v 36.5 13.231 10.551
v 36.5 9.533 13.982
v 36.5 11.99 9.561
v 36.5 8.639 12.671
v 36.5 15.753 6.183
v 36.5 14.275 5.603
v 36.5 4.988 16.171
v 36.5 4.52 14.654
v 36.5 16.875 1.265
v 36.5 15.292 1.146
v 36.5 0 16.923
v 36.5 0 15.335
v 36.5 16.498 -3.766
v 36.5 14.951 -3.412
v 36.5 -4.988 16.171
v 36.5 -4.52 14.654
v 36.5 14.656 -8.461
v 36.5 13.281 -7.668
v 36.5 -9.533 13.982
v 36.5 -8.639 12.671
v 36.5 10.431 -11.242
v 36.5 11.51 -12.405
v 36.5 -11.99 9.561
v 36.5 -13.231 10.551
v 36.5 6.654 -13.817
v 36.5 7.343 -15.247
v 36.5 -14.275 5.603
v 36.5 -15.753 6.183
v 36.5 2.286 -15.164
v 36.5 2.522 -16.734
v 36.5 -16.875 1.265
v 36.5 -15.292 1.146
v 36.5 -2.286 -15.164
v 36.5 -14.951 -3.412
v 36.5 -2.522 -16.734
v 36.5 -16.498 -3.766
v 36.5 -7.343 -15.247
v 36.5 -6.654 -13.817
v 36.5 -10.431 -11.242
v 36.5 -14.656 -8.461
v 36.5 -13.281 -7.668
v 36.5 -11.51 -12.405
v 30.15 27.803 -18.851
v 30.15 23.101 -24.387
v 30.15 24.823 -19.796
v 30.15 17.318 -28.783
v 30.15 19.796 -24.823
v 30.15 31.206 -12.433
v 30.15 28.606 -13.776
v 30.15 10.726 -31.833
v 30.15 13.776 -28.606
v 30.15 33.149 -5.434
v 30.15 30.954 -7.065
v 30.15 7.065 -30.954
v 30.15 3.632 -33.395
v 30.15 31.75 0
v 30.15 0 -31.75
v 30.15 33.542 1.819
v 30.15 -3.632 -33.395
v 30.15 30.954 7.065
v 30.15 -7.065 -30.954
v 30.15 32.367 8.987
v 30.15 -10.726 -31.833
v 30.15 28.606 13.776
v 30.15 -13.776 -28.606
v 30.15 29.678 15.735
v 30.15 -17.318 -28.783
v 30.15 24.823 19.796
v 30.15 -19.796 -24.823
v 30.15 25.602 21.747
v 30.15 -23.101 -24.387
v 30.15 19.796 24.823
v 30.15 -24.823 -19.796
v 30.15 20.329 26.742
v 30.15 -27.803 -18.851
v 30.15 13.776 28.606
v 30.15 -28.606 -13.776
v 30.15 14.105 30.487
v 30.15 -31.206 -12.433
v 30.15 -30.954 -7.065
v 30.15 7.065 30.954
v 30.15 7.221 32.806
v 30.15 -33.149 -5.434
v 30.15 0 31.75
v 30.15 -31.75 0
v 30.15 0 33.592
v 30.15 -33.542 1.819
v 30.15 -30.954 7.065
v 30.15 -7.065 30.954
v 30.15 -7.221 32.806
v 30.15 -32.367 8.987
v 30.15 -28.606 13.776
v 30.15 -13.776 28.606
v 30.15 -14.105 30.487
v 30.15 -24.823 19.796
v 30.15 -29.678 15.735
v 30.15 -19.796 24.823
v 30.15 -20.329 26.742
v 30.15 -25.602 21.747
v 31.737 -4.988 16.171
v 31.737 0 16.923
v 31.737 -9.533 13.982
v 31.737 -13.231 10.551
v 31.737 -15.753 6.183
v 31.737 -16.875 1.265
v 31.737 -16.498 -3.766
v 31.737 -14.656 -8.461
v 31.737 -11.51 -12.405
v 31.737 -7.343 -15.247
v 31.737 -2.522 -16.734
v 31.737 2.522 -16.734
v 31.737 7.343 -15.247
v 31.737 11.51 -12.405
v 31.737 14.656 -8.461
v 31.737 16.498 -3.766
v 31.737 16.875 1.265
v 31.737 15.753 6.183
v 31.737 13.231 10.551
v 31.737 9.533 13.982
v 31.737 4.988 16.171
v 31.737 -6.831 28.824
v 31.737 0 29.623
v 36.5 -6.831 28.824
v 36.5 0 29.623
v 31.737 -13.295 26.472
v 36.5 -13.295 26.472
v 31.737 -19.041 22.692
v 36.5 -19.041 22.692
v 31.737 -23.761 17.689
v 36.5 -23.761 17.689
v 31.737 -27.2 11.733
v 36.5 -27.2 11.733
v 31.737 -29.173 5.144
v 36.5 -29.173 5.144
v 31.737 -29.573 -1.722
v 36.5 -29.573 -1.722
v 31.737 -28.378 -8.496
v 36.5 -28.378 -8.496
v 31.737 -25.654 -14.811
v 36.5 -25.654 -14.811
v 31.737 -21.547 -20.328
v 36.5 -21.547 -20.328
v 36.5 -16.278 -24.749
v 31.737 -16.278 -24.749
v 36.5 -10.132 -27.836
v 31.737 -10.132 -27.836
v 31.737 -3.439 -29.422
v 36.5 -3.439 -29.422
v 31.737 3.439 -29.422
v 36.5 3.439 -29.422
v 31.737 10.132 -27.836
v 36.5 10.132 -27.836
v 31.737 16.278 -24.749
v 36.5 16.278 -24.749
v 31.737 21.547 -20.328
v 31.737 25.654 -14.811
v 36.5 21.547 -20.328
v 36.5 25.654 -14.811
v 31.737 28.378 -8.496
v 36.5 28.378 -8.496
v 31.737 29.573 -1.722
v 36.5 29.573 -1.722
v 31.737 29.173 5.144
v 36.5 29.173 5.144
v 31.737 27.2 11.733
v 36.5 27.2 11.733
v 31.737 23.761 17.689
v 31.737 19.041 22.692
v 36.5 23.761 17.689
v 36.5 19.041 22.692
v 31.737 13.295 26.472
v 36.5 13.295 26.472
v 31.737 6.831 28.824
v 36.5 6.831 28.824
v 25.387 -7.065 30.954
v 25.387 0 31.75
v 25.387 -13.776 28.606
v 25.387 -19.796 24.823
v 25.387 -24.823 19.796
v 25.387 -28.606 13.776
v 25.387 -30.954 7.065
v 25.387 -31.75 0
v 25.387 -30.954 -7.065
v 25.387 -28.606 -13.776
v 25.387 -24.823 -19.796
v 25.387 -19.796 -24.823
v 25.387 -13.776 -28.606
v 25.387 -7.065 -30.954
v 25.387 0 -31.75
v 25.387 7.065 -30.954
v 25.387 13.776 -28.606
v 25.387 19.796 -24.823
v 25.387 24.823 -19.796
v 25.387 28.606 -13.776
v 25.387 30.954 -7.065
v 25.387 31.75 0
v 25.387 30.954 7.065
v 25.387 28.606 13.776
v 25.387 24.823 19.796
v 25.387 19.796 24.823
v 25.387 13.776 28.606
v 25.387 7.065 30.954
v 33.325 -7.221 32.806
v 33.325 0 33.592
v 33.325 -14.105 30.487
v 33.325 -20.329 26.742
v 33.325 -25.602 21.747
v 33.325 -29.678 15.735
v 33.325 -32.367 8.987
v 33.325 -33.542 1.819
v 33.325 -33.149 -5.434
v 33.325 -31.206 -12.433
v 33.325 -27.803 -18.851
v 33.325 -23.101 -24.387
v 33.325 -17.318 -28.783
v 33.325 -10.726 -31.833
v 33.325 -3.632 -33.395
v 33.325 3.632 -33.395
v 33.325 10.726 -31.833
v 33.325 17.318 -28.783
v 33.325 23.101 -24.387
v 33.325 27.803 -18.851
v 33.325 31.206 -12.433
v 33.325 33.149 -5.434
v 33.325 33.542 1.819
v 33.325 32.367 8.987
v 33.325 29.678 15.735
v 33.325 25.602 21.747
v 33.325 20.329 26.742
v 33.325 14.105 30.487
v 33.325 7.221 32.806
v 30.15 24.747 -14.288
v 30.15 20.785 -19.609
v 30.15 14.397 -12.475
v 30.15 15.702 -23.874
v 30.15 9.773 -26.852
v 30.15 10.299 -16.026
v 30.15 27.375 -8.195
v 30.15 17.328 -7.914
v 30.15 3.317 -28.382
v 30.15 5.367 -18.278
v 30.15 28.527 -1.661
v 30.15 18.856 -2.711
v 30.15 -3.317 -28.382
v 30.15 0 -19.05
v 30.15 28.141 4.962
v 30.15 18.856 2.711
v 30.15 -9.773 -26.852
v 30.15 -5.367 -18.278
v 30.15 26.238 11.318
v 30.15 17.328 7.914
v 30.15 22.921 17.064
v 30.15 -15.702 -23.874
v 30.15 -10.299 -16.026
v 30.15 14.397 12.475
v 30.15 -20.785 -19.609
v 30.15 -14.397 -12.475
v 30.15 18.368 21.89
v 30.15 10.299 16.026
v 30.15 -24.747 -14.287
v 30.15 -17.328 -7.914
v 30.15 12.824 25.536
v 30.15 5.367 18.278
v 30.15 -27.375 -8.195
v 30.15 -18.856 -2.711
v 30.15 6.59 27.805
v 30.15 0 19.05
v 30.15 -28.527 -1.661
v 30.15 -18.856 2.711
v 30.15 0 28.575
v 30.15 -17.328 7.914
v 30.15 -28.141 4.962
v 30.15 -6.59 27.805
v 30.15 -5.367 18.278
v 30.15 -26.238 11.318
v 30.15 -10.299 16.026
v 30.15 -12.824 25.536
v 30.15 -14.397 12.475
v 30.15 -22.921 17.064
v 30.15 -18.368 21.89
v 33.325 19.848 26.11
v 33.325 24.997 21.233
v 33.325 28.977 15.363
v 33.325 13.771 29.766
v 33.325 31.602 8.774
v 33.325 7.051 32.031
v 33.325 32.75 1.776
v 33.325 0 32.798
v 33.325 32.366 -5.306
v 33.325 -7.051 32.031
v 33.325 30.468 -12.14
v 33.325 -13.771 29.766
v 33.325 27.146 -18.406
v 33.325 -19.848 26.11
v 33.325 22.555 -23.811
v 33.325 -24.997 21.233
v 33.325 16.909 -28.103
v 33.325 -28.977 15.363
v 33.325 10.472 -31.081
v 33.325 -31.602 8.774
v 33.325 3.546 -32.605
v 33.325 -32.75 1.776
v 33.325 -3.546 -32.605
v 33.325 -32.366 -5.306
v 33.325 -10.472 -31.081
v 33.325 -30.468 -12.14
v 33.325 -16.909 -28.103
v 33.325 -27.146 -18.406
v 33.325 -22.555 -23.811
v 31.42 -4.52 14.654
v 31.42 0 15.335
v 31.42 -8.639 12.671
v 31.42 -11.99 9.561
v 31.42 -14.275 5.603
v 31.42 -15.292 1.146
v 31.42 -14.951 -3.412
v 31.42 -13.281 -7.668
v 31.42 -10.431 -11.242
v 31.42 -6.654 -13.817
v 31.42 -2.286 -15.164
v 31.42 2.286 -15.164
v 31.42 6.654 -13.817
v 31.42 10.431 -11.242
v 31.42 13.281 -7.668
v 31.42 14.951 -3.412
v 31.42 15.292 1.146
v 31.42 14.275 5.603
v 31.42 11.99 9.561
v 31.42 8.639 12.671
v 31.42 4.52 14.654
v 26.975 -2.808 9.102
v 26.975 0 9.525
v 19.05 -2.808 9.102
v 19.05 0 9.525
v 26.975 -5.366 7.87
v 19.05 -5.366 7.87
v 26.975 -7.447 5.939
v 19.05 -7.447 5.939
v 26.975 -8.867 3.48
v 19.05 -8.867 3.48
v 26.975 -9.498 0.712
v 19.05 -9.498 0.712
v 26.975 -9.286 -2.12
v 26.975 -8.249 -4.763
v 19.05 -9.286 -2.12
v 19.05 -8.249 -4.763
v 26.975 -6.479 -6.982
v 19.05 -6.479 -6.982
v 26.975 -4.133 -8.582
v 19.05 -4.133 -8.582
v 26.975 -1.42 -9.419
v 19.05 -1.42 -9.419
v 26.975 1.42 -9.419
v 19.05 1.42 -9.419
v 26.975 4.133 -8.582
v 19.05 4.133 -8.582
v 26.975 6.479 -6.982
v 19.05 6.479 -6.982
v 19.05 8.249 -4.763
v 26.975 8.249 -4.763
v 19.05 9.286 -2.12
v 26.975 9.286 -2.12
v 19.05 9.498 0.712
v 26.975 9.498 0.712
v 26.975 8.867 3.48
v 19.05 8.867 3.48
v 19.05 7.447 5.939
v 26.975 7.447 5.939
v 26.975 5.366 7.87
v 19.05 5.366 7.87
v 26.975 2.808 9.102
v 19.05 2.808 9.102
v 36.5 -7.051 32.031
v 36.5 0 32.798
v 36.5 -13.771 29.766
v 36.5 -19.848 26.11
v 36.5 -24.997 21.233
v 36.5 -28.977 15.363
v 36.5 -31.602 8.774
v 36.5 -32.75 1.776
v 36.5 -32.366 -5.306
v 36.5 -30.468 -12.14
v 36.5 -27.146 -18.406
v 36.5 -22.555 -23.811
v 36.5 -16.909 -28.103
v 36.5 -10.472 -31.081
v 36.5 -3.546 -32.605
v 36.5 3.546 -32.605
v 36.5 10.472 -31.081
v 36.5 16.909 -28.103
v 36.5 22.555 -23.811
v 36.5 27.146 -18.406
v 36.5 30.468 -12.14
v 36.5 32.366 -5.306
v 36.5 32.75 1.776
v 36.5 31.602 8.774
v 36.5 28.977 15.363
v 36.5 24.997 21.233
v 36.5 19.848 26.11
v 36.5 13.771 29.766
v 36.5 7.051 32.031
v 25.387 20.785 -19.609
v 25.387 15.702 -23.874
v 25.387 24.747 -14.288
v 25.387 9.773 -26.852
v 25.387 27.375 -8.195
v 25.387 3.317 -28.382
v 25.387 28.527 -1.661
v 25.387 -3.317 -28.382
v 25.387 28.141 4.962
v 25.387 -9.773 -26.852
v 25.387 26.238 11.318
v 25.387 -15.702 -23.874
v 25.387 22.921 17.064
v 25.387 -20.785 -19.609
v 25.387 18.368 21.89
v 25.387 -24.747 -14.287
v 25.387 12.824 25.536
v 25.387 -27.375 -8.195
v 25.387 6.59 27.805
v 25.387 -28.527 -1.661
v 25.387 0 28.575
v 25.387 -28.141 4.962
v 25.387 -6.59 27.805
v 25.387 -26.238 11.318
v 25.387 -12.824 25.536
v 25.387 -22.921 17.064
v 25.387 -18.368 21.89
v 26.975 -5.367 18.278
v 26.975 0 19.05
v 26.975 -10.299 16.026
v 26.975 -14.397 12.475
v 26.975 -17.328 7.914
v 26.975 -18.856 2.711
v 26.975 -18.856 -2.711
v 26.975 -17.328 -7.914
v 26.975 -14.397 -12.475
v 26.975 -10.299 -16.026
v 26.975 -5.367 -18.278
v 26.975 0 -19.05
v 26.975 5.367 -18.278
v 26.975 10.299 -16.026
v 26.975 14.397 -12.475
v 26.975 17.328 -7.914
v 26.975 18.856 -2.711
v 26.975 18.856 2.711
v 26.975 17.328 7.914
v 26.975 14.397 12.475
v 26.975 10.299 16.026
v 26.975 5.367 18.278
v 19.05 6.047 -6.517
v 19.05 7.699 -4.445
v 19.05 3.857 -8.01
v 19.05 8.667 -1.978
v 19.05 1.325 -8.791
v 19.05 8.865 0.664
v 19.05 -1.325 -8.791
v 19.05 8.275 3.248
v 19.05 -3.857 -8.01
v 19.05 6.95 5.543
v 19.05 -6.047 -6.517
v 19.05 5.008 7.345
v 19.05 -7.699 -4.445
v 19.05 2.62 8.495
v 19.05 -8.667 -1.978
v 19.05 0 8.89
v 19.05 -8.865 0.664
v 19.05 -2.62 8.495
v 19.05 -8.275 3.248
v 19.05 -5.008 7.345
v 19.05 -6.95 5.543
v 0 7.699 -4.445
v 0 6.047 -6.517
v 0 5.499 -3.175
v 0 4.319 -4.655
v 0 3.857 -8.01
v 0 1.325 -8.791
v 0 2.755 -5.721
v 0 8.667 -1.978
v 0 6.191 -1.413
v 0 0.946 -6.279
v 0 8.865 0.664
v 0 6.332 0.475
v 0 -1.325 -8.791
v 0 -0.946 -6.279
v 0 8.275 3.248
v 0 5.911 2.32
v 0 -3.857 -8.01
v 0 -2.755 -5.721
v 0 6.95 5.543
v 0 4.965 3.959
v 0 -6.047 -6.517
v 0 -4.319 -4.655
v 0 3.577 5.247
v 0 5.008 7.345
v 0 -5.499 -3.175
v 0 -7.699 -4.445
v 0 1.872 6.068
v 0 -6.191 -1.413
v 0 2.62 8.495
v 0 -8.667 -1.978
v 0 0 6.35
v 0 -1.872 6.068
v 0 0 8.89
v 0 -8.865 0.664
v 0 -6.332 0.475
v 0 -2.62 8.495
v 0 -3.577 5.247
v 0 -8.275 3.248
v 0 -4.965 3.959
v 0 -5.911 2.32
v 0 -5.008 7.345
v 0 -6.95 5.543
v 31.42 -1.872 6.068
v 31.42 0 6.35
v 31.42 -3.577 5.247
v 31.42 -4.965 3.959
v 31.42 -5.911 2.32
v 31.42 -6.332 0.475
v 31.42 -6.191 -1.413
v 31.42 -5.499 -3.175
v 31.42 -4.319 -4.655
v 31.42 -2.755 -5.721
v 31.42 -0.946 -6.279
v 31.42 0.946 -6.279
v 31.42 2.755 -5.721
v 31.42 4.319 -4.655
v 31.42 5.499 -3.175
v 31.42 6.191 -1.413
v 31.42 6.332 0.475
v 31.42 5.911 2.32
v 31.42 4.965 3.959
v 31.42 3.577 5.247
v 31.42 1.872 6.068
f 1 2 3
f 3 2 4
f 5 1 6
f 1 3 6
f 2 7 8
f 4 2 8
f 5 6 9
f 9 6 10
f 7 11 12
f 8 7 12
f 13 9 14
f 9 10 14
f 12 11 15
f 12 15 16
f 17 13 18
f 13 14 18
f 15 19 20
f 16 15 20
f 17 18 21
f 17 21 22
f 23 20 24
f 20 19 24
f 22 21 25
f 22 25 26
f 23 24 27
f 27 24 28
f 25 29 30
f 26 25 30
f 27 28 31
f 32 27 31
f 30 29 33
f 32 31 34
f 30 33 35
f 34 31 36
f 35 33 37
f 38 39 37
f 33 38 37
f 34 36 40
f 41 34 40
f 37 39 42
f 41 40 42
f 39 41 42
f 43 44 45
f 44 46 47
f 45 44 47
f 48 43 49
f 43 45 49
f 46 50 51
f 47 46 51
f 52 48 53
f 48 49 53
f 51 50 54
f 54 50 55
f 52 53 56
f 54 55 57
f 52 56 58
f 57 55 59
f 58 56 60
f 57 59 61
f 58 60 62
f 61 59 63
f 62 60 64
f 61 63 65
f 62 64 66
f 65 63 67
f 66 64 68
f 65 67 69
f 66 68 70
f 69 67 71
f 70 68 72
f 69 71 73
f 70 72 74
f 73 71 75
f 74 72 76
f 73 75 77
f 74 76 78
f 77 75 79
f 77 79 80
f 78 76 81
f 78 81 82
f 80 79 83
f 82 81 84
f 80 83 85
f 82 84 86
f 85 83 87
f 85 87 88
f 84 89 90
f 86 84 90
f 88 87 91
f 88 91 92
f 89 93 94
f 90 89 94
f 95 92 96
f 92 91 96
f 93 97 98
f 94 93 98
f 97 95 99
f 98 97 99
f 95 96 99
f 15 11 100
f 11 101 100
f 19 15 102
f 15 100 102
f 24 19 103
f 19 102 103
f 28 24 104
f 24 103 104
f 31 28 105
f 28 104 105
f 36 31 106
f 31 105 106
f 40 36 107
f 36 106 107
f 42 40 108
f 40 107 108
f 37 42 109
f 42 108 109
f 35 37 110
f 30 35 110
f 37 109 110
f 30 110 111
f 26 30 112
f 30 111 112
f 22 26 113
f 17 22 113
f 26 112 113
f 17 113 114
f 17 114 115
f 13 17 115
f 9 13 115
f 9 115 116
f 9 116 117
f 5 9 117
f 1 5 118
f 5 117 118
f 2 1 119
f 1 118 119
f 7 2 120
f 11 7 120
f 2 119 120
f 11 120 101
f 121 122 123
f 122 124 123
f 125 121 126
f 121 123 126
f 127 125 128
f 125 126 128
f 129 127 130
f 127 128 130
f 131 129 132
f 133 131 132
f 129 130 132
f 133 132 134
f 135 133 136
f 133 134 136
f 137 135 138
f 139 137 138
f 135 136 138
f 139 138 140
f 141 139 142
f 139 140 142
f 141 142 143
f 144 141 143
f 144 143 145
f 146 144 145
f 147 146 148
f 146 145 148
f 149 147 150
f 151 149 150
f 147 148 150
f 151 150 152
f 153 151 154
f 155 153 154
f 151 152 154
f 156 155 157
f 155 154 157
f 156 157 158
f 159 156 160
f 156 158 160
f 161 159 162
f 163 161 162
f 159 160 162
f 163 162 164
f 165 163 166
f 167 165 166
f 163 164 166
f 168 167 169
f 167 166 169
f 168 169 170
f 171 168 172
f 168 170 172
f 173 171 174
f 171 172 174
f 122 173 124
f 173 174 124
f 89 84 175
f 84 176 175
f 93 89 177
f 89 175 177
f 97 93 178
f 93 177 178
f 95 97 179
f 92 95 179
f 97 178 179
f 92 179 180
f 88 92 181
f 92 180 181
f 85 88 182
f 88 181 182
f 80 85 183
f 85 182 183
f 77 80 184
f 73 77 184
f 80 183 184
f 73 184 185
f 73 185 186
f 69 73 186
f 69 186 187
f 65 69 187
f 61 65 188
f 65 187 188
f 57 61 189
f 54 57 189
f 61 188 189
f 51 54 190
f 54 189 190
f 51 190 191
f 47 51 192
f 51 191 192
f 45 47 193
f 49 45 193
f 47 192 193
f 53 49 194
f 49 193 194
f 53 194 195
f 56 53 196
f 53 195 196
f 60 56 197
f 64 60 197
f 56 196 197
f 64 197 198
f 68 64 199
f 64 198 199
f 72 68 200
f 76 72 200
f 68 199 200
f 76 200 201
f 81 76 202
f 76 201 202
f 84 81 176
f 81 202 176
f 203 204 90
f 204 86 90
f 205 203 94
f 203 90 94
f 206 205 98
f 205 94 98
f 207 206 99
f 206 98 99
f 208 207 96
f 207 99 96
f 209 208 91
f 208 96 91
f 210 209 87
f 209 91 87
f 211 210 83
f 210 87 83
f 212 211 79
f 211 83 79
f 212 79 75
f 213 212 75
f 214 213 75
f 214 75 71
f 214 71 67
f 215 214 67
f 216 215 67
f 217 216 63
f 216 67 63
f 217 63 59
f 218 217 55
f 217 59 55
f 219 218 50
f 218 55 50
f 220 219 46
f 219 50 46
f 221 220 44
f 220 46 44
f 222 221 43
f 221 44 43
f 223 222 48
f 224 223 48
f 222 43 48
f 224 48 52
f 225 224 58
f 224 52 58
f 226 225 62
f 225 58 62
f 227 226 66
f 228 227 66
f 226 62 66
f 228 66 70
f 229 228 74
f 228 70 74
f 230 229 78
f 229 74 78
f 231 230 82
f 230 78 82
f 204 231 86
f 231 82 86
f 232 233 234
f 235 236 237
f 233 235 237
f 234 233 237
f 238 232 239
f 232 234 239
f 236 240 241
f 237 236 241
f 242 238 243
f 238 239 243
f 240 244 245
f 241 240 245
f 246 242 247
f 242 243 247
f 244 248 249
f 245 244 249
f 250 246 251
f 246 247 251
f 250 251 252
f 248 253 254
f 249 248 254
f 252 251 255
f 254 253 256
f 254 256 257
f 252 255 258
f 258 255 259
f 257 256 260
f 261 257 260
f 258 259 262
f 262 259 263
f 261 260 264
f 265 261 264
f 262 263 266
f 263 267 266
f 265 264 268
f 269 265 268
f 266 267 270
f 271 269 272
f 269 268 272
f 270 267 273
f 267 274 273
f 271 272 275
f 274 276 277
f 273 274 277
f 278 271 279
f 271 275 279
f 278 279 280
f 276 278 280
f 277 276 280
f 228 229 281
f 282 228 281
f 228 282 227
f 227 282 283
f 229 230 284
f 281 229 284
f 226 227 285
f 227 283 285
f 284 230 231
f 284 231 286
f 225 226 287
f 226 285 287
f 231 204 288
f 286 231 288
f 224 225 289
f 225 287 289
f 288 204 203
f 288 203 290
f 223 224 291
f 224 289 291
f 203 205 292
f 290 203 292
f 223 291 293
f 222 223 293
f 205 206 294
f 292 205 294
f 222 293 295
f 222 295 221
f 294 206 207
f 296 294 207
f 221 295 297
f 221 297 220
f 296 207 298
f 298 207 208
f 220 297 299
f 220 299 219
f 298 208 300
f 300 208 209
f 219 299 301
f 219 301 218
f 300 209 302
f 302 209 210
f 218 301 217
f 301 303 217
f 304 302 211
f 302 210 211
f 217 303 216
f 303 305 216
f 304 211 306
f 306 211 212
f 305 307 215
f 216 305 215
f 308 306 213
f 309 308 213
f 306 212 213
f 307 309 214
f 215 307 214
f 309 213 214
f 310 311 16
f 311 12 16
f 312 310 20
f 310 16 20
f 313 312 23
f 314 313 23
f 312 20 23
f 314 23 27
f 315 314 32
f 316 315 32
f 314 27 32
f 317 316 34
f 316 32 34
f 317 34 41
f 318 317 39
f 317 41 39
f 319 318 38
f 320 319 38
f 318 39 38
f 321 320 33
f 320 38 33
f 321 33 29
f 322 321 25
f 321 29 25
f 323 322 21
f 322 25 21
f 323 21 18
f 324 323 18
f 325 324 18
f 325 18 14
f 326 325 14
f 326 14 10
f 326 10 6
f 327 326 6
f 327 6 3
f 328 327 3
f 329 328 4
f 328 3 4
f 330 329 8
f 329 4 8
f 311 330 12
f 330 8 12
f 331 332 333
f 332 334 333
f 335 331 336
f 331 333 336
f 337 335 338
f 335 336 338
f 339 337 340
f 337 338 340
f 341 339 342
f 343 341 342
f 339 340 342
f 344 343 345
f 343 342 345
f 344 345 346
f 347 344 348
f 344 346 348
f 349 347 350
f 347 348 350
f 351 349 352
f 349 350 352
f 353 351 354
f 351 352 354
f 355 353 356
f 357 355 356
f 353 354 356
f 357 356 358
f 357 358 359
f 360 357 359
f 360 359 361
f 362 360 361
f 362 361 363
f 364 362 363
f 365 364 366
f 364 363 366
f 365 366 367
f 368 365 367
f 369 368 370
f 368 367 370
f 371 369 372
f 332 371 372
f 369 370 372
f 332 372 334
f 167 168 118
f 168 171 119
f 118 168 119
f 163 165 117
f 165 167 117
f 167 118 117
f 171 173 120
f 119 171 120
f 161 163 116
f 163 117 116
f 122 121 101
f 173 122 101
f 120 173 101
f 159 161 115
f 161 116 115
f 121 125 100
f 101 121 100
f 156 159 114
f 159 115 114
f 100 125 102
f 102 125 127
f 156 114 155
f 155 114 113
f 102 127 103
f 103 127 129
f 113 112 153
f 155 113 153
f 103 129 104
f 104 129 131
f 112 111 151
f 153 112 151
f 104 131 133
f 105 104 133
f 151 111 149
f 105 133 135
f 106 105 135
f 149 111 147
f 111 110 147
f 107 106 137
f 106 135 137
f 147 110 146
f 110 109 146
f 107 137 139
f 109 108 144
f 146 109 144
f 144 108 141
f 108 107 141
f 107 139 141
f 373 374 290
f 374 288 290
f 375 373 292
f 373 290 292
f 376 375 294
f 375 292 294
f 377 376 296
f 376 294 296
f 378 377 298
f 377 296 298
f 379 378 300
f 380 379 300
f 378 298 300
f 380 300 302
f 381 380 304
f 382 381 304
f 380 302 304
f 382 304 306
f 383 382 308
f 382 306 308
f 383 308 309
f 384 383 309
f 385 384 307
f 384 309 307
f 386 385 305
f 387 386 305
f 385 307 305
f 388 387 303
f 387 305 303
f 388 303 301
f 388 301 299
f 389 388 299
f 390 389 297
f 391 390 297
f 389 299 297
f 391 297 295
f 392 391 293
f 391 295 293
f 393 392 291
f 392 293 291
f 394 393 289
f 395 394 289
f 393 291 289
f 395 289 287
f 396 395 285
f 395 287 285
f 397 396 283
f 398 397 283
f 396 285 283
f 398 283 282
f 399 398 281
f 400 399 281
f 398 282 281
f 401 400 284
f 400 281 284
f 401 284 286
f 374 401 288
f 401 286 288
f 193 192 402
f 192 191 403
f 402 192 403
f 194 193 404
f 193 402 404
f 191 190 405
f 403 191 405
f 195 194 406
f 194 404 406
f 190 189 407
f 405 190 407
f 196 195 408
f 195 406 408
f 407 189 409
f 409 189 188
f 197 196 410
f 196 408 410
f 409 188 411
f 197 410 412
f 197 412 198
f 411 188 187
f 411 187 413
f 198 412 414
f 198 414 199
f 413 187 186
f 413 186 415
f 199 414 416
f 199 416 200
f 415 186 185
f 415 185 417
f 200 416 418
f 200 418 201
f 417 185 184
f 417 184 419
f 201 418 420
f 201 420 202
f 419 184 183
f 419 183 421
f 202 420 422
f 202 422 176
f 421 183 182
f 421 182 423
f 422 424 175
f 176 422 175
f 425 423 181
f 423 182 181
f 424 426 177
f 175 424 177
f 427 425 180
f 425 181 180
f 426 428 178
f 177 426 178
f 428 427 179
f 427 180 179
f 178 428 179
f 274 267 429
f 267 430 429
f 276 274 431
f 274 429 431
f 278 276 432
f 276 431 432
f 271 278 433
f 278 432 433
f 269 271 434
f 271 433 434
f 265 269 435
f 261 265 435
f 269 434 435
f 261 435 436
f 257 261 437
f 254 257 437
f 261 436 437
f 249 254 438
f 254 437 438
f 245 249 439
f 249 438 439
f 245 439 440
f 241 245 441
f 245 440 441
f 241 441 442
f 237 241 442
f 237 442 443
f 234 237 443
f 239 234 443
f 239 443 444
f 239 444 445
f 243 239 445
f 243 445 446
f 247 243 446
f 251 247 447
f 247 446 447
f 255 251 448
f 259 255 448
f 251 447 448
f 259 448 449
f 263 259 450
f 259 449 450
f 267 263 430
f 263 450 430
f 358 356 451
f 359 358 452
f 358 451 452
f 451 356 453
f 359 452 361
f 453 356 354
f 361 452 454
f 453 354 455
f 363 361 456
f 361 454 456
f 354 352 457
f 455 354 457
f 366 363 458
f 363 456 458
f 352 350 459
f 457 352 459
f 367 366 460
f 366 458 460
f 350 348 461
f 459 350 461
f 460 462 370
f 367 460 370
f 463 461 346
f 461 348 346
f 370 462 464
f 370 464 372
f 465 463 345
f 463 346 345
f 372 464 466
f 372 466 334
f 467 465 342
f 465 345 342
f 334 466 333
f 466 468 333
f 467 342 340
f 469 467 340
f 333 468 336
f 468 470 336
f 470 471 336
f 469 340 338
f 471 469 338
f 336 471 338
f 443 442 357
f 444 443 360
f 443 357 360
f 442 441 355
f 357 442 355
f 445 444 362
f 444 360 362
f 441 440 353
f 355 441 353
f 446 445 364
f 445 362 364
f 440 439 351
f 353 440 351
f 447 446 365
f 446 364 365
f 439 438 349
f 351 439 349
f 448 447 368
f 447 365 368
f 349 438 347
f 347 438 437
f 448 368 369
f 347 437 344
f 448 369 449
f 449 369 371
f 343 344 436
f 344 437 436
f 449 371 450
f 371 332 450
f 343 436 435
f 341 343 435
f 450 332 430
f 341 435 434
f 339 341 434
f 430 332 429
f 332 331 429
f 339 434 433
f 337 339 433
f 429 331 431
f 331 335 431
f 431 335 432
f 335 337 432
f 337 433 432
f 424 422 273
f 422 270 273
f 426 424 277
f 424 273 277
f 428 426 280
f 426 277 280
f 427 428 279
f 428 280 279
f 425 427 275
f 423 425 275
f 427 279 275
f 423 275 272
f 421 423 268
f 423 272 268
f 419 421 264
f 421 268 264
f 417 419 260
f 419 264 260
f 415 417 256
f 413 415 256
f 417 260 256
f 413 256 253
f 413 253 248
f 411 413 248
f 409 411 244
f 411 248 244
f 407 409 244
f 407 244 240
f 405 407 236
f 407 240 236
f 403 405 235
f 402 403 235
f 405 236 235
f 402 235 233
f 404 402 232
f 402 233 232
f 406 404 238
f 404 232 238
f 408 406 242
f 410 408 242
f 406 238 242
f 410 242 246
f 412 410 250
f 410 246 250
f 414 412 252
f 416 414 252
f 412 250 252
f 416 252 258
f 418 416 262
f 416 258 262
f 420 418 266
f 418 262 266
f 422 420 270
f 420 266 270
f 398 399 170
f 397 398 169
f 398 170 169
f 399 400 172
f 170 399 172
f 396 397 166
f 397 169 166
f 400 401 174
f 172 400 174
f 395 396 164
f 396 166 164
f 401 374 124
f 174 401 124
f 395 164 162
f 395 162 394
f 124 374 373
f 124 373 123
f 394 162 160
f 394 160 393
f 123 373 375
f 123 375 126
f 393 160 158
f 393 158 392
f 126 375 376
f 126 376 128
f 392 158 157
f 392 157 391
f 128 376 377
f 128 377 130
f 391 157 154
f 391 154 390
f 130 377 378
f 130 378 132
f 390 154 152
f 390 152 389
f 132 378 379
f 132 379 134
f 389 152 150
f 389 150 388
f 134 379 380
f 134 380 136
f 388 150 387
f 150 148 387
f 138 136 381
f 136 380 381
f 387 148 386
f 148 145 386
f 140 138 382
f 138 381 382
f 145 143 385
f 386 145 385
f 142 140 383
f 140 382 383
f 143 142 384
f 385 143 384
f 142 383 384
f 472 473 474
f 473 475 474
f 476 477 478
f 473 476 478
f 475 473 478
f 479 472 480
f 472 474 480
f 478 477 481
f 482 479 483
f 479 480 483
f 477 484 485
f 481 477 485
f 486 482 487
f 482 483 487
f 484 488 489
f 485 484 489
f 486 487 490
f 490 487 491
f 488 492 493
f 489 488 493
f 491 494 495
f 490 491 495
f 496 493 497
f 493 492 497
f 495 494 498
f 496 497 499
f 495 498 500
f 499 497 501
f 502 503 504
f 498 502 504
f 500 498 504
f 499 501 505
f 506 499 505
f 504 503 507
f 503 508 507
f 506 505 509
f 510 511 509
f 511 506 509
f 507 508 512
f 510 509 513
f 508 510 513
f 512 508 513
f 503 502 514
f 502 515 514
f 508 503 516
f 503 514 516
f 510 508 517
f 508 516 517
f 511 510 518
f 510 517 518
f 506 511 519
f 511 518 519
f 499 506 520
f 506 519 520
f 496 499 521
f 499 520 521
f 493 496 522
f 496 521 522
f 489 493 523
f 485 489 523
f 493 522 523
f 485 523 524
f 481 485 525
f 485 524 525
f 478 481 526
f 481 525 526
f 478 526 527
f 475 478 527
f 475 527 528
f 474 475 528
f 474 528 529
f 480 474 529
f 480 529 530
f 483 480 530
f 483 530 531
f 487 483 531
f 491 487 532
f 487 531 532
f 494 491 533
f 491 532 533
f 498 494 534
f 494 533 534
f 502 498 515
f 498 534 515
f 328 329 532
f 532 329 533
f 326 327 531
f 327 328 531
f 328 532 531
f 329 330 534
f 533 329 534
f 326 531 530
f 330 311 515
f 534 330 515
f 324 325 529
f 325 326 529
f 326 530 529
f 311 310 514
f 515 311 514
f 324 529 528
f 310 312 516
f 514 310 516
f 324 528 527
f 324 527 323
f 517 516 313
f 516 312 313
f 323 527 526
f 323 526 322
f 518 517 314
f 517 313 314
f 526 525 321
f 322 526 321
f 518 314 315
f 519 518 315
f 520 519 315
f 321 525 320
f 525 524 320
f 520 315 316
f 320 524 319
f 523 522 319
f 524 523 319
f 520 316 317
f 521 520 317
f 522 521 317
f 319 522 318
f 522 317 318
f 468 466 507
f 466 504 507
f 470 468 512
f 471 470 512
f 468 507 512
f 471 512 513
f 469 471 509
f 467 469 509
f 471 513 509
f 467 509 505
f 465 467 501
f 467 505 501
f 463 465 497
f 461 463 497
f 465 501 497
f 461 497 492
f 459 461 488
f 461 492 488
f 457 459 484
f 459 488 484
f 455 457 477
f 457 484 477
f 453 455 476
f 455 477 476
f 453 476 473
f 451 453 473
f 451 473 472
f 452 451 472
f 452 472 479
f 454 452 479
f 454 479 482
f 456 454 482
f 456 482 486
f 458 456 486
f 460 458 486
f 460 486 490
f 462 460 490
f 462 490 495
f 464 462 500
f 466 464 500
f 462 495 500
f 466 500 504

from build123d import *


with BuildPart() as part:
    # Sketch1 → Revolve1 (revolve)
    with BuildSketch(Plane.XY, mode=Mode.PRIVATE) as revolve1_sk:
        Polygon((0, 6.35), (31.4198, 6.35), (31.4198, 15.33525), (36.4998, 15.33525), (36.4998, 16.92275), (31.7373, 16.92275), (31.7373, 29.62275), (36.4998, 29.62275), (36.4998, 32.79775), (33.3248, 32.79775), (33.3248, 33.5915), (30.1498, 33.5915), (30.1498, 31.75), (25.3873, 31.75), (25.3873, 28.575), (30.1498, 28.575), (30.1498, 19.05), (26.9748, 19.05), (26.9748, 9.525), (19.05, 9.525), (19.05, 8.89), (0, 8.89), align=None)
    revolve(revolve1_sk.sketch.rotate(Axis((0, 0, 0), (1, 0, 0)), 90), axis=Axis((0, 0, 0), (1, 0, 0)))


solid = part.part
